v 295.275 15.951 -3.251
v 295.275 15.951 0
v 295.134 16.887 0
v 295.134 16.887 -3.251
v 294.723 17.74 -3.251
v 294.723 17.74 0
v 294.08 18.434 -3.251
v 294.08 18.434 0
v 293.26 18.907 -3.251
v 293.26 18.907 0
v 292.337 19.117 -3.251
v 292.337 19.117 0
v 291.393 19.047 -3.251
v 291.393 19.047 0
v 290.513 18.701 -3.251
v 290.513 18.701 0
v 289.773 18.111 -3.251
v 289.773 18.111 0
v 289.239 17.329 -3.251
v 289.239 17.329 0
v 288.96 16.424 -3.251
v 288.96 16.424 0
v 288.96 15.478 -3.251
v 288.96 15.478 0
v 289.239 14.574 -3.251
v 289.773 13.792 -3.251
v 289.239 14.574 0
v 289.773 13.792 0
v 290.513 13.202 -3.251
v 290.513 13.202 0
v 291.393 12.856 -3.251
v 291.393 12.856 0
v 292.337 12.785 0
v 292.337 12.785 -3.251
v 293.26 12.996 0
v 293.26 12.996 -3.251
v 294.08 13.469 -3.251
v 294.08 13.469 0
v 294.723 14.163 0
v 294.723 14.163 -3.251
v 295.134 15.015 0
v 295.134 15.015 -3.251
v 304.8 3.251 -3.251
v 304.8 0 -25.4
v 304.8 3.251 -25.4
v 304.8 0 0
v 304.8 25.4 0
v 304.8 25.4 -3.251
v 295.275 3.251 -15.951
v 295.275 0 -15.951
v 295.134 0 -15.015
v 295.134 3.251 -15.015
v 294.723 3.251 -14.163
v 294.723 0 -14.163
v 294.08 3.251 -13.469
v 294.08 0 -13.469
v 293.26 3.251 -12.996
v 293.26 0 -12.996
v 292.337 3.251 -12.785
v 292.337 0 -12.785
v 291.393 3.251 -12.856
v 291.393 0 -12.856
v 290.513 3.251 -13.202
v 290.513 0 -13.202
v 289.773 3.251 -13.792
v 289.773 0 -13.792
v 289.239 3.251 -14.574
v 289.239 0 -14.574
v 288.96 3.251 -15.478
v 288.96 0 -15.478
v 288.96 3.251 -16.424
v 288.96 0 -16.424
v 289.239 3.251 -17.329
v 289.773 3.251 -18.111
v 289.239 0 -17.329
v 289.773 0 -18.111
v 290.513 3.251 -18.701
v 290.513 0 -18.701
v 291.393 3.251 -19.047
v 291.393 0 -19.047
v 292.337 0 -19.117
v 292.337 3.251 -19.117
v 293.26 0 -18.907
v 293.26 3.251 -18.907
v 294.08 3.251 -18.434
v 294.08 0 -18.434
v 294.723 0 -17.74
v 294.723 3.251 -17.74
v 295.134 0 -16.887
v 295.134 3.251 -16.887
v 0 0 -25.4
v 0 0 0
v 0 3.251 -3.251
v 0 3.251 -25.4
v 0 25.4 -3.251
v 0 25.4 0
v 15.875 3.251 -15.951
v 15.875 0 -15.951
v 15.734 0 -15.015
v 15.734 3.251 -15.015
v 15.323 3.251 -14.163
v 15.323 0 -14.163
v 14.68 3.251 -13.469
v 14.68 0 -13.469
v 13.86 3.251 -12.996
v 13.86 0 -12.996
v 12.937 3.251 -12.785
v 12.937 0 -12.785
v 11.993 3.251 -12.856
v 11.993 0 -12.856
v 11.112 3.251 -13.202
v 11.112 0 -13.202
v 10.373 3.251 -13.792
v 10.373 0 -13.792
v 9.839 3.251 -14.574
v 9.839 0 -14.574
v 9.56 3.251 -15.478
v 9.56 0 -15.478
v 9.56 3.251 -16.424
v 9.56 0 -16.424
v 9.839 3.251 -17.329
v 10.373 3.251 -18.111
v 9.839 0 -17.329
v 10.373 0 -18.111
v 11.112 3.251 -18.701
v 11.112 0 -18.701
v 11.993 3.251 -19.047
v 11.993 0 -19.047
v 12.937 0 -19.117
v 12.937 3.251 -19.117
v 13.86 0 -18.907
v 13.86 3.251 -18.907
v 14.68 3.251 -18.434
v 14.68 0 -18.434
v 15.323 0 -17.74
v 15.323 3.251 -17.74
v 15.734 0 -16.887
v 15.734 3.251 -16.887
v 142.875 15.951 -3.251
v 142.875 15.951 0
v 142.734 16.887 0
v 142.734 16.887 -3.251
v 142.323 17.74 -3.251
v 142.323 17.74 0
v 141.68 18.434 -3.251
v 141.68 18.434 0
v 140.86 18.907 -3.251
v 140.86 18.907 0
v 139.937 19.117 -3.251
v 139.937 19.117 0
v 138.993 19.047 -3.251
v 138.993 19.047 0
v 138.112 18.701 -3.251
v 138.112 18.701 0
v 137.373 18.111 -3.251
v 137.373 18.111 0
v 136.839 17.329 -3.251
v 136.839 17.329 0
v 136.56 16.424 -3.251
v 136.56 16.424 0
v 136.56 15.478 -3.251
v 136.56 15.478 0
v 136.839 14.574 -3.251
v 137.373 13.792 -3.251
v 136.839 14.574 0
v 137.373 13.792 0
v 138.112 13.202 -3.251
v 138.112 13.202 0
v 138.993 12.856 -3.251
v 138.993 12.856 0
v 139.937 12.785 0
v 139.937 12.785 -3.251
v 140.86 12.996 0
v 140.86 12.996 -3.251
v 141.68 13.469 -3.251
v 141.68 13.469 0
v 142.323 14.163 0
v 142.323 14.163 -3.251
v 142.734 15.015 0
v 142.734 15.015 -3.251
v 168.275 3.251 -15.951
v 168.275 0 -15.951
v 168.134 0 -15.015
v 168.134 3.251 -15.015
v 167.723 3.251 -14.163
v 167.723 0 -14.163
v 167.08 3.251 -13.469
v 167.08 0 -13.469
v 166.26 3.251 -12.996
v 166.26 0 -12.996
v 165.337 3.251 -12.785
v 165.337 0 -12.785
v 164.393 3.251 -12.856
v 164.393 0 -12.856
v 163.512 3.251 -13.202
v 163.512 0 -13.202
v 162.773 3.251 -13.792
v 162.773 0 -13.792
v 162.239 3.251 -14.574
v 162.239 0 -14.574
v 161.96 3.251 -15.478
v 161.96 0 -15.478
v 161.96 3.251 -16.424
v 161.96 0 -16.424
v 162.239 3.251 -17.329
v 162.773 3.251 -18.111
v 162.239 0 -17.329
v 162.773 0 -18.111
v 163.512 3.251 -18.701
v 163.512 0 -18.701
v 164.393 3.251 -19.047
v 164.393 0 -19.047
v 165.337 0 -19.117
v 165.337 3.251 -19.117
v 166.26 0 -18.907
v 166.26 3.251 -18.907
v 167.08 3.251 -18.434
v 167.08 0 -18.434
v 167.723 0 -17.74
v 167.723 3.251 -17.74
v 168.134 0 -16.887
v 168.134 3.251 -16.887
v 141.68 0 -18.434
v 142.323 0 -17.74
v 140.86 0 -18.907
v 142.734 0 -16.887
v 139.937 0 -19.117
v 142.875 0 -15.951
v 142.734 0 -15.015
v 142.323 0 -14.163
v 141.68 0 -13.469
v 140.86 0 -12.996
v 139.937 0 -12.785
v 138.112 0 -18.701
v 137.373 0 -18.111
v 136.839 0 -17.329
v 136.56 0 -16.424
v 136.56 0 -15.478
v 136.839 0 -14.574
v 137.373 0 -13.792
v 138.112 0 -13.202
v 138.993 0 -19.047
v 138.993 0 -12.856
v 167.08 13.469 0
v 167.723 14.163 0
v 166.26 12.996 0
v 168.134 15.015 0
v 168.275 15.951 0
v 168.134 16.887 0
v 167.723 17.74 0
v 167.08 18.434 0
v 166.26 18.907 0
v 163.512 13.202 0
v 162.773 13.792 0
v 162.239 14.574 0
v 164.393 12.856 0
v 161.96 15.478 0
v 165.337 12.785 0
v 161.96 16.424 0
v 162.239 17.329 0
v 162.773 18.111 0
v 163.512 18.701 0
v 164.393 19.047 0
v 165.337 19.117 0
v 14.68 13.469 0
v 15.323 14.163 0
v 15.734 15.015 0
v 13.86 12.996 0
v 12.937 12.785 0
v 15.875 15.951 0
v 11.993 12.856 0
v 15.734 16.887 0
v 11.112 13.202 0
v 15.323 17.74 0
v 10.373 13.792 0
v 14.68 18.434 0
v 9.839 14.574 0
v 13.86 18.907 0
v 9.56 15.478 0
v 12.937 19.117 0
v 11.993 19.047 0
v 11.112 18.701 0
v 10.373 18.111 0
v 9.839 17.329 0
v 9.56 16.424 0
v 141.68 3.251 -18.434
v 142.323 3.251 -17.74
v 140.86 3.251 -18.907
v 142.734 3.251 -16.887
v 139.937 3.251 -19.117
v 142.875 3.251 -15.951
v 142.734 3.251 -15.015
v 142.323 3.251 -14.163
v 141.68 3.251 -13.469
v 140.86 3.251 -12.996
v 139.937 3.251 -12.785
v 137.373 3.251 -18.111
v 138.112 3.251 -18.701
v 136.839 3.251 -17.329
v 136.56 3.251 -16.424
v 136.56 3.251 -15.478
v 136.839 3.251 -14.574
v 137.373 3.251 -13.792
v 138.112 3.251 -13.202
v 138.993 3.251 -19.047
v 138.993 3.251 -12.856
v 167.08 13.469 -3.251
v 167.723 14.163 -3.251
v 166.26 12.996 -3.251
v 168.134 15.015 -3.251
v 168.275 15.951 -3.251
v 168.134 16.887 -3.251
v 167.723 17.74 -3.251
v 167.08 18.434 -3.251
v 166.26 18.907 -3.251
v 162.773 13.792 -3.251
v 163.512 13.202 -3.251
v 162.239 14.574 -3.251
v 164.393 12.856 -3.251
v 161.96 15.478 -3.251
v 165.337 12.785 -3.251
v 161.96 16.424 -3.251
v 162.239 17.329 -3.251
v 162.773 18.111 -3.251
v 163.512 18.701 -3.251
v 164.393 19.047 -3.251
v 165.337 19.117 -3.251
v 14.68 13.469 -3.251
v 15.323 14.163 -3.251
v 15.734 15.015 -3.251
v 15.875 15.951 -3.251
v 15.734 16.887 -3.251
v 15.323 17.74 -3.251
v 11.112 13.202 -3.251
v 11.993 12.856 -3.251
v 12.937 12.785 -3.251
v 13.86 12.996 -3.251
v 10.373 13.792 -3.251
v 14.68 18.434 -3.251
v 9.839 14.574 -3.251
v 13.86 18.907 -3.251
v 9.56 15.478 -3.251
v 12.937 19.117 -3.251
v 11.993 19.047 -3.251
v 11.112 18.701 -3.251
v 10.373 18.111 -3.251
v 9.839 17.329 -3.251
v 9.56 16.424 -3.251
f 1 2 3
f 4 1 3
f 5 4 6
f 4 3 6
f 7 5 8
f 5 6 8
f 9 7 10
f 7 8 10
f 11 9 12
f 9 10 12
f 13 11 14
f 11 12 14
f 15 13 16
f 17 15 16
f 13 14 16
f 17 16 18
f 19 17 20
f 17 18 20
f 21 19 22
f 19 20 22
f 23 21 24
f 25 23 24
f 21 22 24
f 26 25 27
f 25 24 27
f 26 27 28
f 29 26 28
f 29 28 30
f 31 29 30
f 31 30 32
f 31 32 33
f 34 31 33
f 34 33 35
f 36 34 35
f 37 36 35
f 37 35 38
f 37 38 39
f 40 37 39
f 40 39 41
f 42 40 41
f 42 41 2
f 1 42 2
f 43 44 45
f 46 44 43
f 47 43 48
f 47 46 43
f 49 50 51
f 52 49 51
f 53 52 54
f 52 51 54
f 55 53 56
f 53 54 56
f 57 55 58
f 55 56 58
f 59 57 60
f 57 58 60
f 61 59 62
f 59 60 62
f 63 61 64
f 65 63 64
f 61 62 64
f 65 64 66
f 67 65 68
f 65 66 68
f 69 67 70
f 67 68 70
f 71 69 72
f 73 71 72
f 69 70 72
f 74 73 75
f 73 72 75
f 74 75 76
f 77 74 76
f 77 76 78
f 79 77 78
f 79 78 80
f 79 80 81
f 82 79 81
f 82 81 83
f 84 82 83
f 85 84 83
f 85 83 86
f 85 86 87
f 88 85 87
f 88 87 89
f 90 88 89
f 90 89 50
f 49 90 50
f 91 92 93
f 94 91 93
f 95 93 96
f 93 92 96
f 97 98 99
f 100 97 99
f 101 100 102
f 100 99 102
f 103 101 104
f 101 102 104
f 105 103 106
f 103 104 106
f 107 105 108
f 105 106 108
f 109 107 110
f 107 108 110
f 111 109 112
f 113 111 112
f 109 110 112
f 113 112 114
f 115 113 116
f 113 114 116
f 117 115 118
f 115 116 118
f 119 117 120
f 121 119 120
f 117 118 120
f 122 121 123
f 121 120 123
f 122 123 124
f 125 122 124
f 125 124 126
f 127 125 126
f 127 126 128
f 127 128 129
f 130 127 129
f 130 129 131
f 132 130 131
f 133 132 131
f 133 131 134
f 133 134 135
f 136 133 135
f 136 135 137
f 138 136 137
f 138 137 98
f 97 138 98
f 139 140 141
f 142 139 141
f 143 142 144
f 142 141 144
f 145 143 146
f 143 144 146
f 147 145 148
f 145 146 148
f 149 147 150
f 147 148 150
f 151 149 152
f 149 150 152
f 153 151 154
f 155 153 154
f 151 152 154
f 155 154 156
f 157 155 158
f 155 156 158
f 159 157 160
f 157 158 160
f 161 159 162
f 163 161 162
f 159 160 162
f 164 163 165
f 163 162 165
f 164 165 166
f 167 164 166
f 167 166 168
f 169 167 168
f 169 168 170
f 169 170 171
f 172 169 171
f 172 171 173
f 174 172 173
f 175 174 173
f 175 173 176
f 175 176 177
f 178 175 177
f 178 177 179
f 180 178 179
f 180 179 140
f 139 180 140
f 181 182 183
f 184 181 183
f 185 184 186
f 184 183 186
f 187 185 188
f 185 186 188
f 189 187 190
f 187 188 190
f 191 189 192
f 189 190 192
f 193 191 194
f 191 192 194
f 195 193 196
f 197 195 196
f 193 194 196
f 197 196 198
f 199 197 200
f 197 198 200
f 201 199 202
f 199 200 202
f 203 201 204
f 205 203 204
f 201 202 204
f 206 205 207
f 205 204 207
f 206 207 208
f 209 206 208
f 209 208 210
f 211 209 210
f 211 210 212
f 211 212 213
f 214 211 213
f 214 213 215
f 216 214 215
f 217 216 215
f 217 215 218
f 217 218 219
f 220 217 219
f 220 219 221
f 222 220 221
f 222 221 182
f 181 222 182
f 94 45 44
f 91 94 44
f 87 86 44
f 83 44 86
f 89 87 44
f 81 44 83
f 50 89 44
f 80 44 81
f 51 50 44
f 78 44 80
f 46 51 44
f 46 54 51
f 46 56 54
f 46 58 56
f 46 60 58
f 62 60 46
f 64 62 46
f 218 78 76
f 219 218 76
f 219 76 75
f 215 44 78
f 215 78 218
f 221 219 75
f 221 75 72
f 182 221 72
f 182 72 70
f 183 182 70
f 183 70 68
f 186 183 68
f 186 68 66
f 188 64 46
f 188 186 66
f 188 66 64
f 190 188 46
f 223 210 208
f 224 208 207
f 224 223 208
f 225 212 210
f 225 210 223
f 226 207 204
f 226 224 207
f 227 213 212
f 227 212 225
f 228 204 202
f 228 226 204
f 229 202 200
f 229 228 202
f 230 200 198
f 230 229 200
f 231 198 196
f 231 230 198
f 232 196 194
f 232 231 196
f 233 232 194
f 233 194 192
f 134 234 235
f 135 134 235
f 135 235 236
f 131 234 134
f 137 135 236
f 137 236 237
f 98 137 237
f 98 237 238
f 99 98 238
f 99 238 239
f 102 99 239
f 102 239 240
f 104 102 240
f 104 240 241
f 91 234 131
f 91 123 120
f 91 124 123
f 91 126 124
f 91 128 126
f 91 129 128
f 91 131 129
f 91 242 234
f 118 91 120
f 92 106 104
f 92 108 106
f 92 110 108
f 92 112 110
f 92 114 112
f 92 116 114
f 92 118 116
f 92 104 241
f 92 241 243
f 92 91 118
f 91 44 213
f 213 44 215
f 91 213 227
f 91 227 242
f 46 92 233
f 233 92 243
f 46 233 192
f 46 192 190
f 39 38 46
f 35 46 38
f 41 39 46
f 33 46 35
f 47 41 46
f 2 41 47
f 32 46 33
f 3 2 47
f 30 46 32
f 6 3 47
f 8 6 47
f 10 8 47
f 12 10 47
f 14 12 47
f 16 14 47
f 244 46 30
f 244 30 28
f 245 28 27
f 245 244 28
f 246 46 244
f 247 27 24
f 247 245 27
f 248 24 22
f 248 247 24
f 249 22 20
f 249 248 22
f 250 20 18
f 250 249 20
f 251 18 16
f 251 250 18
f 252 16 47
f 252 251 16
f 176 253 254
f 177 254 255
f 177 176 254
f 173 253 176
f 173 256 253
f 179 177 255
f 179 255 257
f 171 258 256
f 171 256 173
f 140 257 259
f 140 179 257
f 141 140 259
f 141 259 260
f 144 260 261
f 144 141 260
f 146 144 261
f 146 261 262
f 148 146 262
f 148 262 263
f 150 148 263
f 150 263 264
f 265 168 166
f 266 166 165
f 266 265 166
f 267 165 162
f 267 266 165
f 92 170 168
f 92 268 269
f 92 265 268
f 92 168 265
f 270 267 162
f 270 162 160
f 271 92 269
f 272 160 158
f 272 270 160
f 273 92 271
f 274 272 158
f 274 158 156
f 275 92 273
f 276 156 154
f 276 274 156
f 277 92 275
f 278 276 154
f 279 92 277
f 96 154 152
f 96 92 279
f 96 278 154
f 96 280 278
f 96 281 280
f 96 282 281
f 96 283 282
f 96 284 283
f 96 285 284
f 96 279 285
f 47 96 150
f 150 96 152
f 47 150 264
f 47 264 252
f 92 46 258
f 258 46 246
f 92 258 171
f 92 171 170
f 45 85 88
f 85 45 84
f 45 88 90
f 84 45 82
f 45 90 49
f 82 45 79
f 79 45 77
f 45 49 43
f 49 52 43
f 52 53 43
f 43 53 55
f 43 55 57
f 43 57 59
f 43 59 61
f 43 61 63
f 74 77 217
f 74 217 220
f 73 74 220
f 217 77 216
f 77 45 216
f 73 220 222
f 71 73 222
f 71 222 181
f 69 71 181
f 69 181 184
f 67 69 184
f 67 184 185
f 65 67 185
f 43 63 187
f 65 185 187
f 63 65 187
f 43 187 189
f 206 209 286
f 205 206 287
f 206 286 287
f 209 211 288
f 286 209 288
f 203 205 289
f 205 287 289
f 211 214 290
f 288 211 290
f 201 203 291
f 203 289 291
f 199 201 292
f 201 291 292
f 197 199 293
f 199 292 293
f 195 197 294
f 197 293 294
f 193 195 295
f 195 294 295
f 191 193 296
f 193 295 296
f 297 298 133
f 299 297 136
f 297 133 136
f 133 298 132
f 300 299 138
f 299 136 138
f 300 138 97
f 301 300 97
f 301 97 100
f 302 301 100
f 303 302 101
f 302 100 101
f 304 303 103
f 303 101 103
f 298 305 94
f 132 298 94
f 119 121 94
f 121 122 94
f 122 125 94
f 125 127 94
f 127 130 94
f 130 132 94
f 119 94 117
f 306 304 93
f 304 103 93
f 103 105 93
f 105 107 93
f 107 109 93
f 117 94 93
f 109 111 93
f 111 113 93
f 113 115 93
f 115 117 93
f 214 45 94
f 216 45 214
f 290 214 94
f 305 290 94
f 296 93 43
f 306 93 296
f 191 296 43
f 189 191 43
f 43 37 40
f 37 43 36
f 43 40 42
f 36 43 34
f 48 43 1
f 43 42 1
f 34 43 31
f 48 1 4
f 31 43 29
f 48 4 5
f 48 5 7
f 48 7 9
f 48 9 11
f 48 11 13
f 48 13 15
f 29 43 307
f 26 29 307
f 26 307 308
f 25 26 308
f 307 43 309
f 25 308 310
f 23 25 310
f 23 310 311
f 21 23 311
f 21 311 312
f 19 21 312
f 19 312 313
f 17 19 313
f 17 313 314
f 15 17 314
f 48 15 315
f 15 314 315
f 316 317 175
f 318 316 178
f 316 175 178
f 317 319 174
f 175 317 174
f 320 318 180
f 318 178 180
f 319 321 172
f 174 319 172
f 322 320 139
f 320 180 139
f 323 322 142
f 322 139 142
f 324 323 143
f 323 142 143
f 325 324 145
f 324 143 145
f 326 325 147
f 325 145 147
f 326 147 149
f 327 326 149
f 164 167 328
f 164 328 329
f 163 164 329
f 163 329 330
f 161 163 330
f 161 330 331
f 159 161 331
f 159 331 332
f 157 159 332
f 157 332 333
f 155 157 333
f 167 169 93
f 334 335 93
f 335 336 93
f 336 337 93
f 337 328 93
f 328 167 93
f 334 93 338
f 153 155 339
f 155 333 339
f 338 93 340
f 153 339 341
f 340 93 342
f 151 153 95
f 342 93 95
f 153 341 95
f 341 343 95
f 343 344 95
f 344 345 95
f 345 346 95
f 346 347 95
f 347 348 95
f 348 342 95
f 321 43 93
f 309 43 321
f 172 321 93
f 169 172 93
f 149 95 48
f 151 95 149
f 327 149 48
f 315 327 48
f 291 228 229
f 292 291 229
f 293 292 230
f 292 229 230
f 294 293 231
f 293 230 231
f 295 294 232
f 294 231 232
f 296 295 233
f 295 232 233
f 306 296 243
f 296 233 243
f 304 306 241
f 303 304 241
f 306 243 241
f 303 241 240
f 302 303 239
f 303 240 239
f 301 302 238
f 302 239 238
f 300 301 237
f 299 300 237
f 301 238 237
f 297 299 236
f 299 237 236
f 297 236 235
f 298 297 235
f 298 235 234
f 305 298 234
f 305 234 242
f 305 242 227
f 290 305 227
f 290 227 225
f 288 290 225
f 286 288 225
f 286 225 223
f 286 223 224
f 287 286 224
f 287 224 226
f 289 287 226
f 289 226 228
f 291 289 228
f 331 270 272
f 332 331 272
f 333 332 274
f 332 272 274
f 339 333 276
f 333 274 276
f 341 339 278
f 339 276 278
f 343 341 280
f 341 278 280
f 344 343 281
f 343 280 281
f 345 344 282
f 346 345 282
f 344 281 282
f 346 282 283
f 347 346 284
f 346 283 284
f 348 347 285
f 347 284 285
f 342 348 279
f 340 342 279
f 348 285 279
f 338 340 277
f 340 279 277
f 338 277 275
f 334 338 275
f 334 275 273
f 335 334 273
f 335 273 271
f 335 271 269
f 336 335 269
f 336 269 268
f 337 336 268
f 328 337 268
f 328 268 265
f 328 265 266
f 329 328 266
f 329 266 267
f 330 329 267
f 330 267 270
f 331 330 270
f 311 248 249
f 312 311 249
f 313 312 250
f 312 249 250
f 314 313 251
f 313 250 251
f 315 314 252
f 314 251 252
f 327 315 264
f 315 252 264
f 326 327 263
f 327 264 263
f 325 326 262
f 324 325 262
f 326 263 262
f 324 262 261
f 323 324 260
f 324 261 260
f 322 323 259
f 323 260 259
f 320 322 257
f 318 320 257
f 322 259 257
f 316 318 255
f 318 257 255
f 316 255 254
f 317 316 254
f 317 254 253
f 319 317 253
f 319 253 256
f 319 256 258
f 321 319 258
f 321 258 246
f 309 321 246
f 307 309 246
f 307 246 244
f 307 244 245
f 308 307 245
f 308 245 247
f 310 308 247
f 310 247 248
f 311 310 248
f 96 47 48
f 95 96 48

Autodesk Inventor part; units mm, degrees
ref_plane "YZ Plane" through (0, 0, 0) normal (1, 0, 0) x (0, 1, 0)
ref_plane "XZ Plane" through (0, 0, 0) normal (0, 1, 0) x (-1, 0, 0)
ref_plane "XY Plane" through (0, 0, 0) normal (0, 0, 1) x (1, 0, 0)
sketch "Sketch1" plane through (0, 0, 0) normal (1, 0, 0) x (0, 1, 0)
  line L0 (0, 0) -> (25.4, 0)
  line L1 (3.2512, -25.4) -> (0, -25.4)
  line L2 (0, -25.4) -> (0, 0)
  line L3 (3.2512, -3.2512) -> (25.4, -3.2512)
  line L4 (3.2512, -25.4) -> (3.2512, -3.2512)
  line L5 (25.4, 0) -> (25.4, -3.2512)
  dimension "d0" = 25.4
  dimension "d1" = 3.2512
extrude "Extrusion1" add sketch "Sketch1" along normal blind 304.8
sketch "Sketch2" plane through (0, 0, -25.4) normal (0, -1, 0) x (1, 0, 0)
  line L0 (0, 9.4488) -> (110.0411, 9.4488) construction
  line L1 (0, 25.4) -> (304.8, 25.4) projected
  circle A0 centre (12.7, 9.4488) radius 3.175
  circle A1 centre (139.7, 9.4488) radius 3.175
  line L2 (0, 0) -> (0, 25.4) projected
  line L3 (0, 0) -> (304.8, 0) projected
  line L4 (152.4, 25.4) -> (152.4, 0)
  circle A2 centre (292.1, 9.4488) radius 3.175
  circle A3 centre (165.1, 9.4488) radius 3.175
  dimension "d4" = 15.9512
  dimension "d5" = 6.35
  dimension "d6" = 12.7
  dimension "d7" = 139.7
extrude "Extrusion2" cut sketch "Sketch2" against normal blind 304.8 contours A0 | A1 | A2 | A3
sketch "Sketch3" plane through (0, 0, 0) normal (0, 0, 1) x (1, 0, 0)
  line L0 (0, 0) -> (0, 25.4) projected
  line L1 (0, 15.9512) -> (148.4119, 15.9512) construction
  line L2 (0, 0) -> (304.8, 0) projected
  circle A0 centre (12.7, 15.9512) radius 3.175
  circle A1 centre (139.7, 15.9512) radius 3.175
  line L3 (152.4, 0) -> (152.4, 21.95) construction
  circle A2 centre (292.1, 15.9512) radius 3.175
  circle A3 centre (165.1, 15.9512) radius 3.175
  dimension "d10" = 15.9512
  dimension "d11" = 6.35
  dimension "d12" = 12.7
  dimension "d13" = 139.7
extrude "Extrusion3" cut sketch "Sketch3" against normal blind 304.8
properties part number "Middle short L"
